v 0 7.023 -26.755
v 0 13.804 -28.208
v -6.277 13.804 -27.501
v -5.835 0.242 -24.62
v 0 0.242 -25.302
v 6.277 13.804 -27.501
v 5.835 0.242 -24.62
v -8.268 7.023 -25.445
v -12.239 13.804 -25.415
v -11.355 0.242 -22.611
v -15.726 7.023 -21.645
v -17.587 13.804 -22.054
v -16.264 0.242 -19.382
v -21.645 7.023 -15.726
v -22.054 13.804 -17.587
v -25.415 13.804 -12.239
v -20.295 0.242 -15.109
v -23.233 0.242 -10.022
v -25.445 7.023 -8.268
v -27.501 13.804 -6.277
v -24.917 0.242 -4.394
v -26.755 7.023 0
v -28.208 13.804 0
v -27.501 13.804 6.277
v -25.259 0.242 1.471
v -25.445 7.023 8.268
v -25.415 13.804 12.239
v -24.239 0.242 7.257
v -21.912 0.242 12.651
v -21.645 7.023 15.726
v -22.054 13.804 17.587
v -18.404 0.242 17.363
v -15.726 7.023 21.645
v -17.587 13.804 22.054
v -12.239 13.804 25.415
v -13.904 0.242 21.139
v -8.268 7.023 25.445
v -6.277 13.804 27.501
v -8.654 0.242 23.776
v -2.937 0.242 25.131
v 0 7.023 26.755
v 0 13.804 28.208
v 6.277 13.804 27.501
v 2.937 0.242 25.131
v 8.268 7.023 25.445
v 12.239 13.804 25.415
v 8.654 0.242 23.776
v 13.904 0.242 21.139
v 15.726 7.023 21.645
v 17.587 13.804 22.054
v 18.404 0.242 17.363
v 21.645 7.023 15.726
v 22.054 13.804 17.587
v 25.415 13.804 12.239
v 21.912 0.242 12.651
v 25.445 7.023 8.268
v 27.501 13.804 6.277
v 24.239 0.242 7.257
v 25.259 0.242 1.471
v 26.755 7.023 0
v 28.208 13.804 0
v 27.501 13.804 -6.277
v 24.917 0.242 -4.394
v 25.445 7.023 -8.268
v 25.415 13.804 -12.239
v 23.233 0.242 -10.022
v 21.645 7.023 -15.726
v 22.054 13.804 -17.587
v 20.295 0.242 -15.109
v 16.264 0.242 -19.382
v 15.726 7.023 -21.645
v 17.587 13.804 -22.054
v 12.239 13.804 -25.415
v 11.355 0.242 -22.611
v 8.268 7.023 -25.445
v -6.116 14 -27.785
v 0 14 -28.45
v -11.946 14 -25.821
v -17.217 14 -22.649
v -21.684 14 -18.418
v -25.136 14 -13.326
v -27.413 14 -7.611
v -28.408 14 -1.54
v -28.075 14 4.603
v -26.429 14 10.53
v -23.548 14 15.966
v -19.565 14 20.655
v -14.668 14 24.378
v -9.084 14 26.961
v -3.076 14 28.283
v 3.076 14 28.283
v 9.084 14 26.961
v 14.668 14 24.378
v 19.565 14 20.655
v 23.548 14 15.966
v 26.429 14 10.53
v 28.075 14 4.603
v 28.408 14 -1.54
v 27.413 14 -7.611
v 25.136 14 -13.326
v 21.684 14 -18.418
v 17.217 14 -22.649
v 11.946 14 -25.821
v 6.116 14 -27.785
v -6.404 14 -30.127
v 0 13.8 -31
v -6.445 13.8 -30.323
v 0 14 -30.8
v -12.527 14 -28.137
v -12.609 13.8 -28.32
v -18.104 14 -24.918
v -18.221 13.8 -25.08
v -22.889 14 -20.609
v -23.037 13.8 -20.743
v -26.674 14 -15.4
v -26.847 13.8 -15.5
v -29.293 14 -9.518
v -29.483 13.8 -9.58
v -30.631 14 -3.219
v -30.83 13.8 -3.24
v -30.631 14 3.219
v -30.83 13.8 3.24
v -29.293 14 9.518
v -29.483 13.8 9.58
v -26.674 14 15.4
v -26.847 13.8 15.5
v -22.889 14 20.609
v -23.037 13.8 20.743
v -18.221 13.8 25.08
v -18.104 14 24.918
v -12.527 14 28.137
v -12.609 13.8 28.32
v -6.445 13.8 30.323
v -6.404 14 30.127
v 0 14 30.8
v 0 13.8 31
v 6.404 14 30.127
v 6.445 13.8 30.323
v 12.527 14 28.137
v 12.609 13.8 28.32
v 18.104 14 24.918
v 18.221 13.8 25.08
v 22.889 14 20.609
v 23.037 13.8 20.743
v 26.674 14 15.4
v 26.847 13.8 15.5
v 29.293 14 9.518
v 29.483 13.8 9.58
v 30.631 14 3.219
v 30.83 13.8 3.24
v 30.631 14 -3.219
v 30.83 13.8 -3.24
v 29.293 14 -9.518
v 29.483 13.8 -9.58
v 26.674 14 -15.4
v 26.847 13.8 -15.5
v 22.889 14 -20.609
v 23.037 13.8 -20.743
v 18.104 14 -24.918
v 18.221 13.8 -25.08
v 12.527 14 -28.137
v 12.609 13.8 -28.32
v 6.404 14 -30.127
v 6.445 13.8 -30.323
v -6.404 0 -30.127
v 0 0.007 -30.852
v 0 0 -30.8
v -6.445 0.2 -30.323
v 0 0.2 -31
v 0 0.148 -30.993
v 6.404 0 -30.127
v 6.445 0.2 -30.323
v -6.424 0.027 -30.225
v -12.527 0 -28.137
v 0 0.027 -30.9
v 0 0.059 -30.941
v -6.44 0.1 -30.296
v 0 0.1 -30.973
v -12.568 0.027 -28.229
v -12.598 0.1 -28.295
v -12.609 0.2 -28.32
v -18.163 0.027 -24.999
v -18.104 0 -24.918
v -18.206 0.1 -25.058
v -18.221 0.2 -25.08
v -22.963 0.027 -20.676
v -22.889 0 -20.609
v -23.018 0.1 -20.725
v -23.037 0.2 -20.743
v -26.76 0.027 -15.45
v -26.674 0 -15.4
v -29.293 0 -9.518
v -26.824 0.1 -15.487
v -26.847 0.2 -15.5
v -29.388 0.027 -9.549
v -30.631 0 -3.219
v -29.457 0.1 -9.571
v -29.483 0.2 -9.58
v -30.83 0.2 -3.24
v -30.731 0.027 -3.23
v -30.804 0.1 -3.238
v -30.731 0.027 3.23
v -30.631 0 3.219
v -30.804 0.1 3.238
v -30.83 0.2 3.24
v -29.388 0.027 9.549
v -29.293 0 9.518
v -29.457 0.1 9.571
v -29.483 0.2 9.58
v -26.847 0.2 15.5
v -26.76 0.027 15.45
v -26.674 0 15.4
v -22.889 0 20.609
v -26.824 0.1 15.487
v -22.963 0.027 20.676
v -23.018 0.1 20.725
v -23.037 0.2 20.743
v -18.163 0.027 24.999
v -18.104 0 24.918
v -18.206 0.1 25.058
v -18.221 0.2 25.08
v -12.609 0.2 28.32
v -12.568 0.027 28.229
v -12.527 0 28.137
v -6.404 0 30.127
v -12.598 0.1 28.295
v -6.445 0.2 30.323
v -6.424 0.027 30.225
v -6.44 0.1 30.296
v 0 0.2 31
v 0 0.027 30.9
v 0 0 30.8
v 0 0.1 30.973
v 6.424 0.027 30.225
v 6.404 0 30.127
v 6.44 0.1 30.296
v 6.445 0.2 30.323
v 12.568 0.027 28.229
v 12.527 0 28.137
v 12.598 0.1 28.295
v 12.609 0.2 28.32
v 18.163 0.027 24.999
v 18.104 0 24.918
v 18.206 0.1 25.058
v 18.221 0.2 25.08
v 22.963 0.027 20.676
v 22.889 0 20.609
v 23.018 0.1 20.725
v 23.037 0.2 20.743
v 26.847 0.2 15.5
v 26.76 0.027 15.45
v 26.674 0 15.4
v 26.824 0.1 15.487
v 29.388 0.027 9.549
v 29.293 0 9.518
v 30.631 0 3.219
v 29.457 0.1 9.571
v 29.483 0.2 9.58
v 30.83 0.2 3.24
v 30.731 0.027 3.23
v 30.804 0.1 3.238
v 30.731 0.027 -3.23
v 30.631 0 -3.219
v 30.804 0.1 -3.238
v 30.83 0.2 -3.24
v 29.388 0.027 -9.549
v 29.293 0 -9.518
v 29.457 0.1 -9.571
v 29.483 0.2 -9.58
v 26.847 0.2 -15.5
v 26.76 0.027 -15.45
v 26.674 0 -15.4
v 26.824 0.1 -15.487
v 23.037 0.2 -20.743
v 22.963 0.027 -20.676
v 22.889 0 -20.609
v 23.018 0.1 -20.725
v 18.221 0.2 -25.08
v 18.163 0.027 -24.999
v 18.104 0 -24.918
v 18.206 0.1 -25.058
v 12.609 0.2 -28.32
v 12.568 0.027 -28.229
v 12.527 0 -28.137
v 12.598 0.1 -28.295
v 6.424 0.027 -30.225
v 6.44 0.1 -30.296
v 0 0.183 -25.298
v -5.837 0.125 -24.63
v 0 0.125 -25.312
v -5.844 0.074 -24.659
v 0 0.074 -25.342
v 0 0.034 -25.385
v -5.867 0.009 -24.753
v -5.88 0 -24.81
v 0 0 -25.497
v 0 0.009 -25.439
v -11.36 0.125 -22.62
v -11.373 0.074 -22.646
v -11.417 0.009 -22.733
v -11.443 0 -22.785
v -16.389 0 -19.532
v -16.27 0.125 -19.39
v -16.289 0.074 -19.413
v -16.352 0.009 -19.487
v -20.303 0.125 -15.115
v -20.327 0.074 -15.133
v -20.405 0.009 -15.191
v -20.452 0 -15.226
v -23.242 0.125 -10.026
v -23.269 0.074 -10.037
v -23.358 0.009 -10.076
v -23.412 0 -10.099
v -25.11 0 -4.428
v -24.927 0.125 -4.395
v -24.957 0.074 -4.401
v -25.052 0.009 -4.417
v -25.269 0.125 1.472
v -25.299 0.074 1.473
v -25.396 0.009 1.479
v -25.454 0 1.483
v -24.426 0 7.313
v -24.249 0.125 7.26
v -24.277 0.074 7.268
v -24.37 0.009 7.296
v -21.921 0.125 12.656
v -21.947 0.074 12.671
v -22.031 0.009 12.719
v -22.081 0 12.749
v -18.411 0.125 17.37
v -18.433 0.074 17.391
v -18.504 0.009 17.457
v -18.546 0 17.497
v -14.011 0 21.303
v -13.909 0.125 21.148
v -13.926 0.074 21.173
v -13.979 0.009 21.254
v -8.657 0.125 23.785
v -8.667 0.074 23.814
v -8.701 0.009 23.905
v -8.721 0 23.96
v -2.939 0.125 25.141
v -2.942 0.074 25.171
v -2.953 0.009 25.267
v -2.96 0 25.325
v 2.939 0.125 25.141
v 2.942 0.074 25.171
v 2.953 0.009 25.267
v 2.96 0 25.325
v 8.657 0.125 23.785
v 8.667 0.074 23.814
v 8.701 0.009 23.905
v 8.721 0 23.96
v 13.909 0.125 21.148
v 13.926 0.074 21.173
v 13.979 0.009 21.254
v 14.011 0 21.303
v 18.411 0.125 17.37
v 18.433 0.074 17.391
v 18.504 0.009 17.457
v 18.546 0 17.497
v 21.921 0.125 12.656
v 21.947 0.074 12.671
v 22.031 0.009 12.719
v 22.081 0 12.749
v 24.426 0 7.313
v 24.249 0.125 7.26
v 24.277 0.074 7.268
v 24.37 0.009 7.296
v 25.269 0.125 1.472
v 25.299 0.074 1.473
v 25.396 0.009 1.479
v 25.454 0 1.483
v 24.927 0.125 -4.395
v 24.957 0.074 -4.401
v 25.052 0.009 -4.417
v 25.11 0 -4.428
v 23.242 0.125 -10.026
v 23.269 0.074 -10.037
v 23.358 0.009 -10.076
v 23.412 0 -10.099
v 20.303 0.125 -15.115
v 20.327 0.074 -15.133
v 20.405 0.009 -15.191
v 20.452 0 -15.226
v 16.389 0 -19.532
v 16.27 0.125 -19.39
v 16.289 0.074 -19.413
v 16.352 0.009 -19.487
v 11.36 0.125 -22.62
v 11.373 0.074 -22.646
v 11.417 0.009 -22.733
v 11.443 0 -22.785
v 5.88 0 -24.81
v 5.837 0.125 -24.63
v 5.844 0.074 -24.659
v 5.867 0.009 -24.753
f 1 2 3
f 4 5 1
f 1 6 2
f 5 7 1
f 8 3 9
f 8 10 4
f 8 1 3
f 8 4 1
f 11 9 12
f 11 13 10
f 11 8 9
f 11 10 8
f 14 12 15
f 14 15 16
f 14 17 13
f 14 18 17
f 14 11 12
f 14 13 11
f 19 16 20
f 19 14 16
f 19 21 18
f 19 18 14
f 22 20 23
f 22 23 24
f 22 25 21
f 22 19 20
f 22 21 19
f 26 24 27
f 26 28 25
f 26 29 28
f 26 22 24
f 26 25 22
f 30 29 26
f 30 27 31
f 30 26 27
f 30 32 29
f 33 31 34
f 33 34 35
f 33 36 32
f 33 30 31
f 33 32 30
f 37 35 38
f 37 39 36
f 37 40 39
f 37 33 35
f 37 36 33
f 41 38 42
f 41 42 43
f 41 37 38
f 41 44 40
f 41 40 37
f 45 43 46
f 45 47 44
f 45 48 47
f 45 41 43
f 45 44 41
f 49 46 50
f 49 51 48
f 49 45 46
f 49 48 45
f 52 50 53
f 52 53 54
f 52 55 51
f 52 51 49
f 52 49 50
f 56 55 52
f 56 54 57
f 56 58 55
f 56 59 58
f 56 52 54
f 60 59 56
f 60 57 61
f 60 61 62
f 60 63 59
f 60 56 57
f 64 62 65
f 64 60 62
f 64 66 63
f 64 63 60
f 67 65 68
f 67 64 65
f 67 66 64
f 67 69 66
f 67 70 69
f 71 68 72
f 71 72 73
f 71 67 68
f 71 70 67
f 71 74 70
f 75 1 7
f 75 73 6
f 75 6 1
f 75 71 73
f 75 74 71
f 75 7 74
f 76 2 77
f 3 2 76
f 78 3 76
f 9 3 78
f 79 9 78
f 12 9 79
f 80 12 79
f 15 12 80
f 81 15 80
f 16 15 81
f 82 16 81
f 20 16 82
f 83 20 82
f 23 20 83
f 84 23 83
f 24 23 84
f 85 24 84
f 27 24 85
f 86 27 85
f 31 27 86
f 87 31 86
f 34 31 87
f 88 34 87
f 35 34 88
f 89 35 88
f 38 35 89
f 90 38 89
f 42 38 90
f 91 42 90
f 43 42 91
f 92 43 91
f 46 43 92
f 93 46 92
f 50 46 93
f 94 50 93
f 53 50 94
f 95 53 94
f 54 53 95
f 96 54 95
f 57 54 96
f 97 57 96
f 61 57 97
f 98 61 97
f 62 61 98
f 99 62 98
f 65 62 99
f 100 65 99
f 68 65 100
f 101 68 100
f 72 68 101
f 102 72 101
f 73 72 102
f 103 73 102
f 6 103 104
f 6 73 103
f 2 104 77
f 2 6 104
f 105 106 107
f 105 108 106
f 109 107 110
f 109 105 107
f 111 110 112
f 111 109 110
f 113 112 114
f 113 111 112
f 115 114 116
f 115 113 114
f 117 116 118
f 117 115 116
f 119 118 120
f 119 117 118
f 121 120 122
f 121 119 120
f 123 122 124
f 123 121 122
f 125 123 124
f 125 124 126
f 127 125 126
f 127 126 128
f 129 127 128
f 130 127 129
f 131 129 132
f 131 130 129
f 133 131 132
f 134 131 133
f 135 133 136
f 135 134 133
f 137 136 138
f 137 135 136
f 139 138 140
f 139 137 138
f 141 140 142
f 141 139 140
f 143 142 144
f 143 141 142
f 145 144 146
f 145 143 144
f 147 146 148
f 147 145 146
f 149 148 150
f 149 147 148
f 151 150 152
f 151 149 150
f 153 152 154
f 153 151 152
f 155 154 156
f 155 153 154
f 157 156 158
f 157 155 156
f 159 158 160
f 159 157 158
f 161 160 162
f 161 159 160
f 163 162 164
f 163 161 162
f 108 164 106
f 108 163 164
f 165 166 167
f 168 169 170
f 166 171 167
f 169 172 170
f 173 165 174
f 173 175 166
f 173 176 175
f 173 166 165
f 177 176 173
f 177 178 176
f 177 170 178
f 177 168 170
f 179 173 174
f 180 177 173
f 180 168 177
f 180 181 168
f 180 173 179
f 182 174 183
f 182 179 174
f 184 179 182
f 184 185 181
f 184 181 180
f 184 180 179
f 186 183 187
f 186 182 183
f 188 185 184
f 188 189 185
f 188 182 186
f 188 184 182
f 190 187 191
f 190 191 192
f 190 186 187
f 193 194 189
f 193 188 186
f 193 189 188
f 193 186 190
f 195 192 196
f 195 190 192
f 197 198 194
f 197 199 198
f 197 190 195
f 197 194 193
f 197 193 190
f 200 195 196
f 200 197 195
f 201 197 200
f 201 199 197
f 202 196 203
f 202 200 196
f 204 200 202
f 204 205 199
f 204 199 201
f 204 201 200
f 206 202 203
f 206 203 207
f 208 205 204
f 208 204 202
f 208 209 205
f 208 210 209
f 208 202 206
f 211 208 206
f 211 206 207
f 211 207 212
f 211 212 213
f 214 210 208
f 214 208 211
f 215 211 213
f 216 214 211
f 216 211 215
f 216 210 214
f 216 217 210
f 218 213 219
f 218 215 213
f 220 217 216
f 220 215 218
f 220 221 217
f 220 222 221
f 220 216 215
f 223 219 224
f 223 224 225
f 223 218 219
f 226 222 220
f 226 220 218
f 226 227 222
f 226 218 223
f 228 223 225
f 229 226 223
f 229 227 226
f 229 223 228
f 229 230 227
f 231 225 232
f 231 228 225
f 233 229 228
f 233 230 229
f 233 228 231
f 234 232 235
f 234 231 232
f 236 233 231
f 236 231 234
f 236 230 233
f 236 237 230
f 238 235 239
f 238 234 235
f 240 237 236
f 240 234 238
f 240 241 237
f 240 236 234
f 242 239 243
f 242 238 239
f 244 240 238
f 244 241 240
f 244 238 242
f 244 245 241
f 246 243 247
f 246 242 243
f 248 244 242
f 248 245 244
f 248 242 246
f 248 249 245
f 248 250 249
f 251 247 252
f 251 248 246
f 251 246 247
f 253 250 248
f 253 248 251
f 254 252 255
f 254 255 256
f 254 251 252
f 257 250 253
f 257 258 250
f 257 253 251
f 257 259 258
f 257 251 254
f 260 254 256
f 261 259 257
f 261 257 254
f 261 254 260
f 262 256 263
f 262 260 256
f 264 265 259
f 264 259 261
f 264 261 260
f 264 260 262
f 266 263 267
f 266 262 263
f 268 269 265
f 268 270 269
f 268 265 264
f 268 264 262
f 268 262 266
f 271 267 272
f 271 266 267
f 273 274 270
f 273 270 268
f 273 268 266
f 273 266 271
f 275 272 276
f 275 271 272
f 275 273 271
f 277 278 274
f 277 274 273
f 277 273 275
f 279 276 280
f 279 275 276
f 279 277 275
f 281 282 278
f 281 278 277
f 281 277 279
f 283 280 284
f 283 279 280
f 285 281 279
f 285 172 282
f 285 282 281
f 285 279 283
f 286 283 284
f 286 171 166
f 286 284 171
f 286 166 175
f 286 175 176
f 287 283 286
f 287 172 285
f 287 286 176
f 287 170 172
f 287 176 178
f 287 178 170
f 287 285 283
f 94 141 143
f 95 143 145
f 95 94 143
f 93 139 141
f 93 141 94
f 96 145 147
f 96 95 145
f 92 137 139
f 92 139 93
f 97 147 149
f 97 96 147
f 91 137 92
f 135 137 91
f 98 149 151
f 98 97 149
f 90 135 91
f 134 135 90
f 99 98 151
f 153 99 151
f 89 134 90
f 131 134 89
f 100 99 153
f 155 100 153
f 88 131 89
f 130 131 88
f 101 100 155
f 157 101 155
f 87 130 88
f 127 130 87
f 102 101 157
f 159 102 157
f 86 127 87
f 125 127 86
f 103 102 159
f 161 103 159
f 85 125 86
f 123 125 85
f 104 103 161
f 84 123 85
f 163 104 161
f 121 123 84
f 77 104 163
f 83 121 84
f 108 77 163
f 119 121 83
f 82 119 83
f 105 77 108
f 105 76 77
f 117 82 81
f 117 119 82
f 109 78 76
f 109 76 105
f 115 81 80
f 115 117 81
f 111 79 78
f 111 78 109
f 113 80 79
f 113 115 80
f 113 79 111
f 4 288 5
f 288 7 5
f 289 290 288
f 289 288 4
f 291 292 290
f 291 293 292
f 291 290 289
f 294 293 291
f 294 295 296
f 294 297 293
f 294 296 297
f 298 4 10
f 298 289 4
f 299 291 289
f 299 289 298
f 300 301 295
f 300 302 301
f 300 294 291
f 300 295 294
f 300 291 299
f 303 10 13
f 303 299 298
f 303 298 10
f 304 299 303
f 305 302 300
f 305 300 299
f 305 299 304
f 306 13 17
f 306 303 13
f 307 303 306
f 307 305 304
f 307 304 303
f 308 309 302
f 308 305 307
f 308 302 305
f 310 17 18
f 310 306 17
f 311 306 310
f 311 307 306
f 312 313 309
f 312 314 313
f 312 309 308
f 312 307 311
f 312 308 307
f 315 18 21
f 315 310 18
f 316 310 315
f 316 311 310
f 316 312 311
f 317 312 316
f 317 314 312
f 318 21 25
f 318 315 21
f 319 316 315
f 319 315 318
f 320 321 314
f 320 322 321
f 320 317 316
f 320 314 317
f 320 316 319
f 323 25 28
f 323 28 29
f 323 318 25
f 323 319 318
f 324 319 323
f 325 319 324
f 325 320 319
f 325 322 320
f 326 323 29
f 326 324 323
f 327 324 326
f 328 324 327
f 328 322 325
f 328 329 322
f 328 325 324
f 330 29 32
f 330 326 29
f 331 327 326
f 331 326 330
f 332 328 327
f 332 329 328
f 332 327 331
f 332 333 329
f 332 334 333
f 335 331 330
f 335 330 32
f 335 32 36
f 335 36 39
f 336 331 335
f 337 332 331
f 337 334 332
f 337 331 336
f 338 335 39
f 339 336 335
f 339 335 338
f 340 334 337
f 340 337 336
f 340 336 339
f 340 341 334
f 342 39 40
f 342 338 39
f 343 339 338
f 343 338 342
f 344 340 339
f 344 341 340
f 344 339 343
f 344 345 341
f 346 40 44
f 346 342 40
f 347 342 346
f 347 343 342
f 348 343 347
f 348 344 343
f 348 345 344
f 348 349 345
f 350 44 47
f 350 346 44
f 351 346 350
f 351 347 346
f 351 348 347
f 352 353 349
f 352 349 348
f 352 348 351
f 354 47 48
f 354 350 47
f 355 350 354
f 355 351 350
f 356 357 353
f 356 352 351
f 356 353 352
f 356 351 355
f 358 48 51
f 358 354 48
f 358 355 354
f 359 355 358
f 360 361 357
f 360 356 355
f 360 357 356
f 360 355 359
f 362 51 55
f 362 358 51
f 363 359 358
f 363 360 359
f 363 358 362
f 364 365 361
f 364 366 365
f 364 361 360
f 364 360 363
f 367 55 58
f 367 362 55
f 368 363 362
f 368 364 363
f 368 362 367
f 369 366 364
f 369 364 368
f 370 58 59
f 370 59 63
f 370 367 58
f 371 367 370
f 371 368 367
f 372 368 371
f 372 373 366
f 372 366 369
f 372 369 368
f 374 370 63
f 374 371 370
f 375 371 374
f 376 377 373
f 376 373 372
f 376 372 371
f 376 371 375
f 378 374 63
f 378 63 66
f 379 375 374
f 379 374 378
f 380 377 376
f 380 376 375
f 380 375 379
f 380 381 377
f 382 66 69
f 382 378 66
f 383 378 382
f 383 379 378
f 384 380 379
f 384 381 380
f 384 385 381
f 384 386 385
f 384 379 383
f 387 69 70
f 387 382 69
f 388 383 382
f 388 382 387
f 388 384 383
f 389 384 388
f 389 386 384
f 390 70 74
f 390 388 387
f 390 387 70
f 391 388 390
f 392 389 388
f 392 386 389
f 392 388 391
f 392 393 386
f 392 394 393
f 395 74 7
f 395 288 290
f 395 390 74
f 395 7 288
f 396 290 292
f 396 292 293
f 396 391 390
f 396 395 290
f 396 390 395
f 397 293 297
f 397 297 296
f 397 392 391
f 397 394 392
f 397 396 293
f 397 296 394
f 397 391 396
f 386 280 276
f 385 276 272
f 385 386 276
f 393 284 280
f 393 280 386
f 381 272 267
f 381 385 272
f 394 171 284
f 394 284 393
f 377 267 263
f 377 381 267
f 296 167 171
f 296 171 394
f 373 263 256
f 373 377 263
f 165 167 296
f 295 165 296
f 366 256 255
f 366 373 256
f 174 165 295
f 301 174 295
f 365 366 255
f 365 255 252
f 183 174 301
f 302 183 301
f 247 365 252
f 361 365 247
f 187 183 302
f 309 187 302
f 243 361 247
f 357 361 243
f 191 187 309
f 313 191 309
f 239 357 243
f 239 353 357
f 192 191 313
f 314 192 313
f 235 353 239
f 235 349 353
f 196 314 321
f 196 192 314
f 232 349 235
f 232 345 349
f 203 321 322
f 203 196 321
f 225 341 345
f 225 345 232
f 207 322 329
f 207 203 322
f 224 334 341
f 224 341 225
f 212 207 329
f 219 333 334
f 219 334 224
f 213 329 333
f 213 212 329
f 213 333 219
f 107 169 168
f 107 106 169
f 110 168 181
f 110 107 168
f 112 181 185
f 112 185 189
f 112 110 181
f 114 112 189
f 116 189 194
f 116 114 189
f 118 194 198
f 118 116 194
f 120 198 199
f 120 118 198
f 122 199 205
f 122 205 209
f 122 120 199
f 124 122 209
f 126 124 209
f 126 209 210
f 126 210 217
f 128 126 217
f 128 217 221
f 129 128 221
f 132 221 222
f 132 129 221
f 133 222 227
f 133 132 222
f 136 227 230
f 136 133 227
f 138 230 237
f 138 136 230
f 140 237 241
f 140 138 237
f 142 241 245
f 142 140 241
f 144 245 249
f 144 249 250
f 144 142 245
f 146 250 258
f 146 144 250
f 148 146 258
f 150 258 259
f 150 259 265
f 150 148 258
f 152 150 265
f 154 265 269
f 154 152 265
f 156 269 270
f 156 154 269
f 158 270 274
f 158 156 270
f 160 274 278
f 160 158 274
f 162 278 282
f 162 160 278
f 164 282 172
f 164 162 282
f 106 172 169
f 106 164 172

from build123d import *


with BuildPart() as part:
    # Çizim1 → Döndür1 (revolve)
    with BuildSketch(Plane.XY, mode=Mode.PRIVATE) as d_nd_r1_sk:
        with BuildLine():
            Line((-25.497397444, 0), (-30.8, 0))
            ThreePointArc((-30.8, 0), (-30.941421356, 0.058578644), (-31, 0.2))
            Line((-31, 0.2), (-31, 13.8))
            Line((-31, 13.8), (-30.8, 14))
            Line((-30.8, 14), (-28.45, 14))
            Line((-28.45, 14), (-28.208094182, 13.804439517))
            Line((-28.208094182, 13.804439517), (-25.301836961, 0.241905818))
            ThreePointArc((-25.301836961, 0.241905818), (-25.341864226, 0.074264491), (-25.497397444, 0))
        make_face()
    revolve(d_nd_r1_sk.sketch.rotate(Axis((0, 0, 0), (0, 1, 0)), 270), axis=Axis((0, 0, 0), (0, 1, 0)))


solid = part.part
